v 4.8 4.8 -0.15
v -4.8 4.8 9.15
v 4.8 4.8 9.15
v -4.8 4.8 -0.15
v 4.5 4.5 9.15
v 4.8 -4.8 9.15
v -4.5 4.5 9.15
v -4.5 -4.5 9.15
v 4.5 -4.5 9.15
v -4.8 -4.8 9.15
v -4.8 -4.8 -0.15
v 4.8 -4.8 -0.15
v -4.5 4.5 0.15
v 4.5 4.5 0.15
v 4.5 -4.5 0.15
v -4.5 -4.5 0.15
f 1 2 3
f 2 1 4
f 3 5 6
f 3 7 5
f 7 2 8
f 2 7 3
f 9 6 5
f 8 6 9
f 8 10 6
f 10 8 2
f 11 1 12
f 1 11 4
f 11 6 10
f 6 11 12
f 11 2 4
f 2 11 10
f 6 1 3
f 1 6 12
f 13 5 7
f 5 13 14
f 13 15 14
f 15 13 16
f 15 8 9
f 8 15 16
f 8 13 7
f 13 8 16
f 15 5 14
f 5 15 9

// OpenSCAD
// [FL_INDEX: keywords="openscad, 3d_parametric, World_s_Smallest_3D_printed_Soma_Cube_Puzzle, csg_solid" | COT="Parametric OpenSCAD design from 3DCodeverse"]
// Title: World's Smallest 3D printed Soma Cube Puzzle

// ===== file: SmallSomaCube.scad =====
//Scalable Soma Cube, by Alejandro Erickson
//Derived from: http://www.thingiverse.com/thing:3784 and http://www.thingiverse.com/thing:11644


//Size of Unit Cubes in mm.  Perhaps unit-shaveMM should be a multiple of your z-layer height
unit = 3; 

//Amount to shave off (inset) each piece.  Compensates for small print size.
shaveMM=.1;

part = "all";//[corner,ess,tee,rightsnake,leftsnake,angle,ell,all]


module c()
{
	cube(size=unit, center=true);
}



module bigC()
{
	cube(size=100*unit, center=true);
}

module Shave(){
  for (i = [0 : $children-1])	{
	minkowski(){
	difference(){
		bigC(); 
		minkowski(){
			difference(){ 
				bigC(); 
				child(i);
			} 
			cube(size=2*shaveMM, center=true);
		}
	}
	}	
}
}


module c1()
{
  translate([0,0,0.5*unit]) Shave() rotate(180,[0,0,1])  union()
  {
    c();
    translate([unit,0,0]) c();
    translate([unit,unit,0]) c();
    translate([unit,0,unit]) c();
  }
}



module c2()
{
translate([0,0,1.5*unit])  //angle
Shave() rotate(180,[0,0,1]) rotate(90,[0,1,0]) union()
  {
    c();
    translate([unit,0,0]) c();
    translate([unit,unit,0]) c();
  }
}


module c3()
{
translate([0,0,0.5*unit])  //ess
  Shave() rotate(180,[1,0,0]) rotate(90,[0,0,1])  union()
  {
    c();
    translate([unit,0,0]) c();
    translate([unit,unit,0]) c();
    translate([2*unit,unit,0]) c();
  }
}


module c4()
{translate([0,0,0.5*unit])
  Shave() rotate(90,[1,0,0])  union()
  {
    c();
    translate([unit,0,0]) c();
    translate([unit,unit,0]) c();
    translate([2*unit,0,0]) c();
  }
}


module c5()
{translate([0,0,0.5*unit])
  Shave() rotate(180,[0,0,1]) union()
  {
    c();
    translate([unit,0,0]) c();
    translate([unit,unit,0]) c();
    translate([unit,unit,unit]) c();
  }
}


module c6()
{translate([0,0,0.5*unit])
  Shave() union()
  {
    c();
    translate([unit,0,0]) c();
    translate([unit,unit,0]) c();
    translate([0,0,unit]) c();
  }
}


module c7()
{
translate([0,0,2.5*unit])
  Shave() rotate(90,[0,1,0])  union()
  {
    c();
    translate([unit,0,0]) c();
    translate([2*unit,unit,0]) c();
    translate([2*unit,0,0]) c();
  }
}

translate([0,0,-shaveMM])
scale(1) rotate(90,[0,0,1])
{
if(part == "all"){
translate([-2*unit,5*unit,0])  c1(); //corner
translate([-2*unit,2*unit,0]) c3(); //ess
translate([0*unit,0*unit,0]) c4(); //tee
translate([0*unit,2*unit,0]) c6(); //rightsnake
translate([1*unit,6*unit,0]) c5(); //leftsnake
translate([3*unit,3*unit,0]) c2(); //angle
translate([3*unit,5*unit,0]) c7(); //ell
}
else if(part == "corner") c1();
else if(part == "ess") c2();
else if(part == "tee") c3();
else if(part == "leftsnake") c4();
else if(part == "rightsnake") c5();
else if(part == "angle") c6();
else if(part == "ell") c7();
}

// ===== file: SmallSomaCube_-_box_untested.scad =====
//Scalable Soma Cube, by Alejandro Erickson
//Derived from: http://www.thingiverse.com/thing:3784 and http://www.thingiverse.com/thing:11644


//Size of Unit Cubes in mm.  Perhaps unit-shaveMM should be a multiple of your z-layer height
unit = 3; 

//Amount to shave off (inset) each piece.  Compensates for small print size.
shaveMM=.15;

//Box thickness (for the containing box)
boxThickness = .3;

part = "box";//[corner,ess,tee,rightsnake,leftsnake,angle,ell,all,box,lid]

module somaBox(){
render() 
	translate([0,0,0.5*(3*unit+boxThickness)]) difference(){
  		cube(size=[3*unit+2*boxThickness,3*unit+2*boxThickness, 3*unit+boxThickness],center=true);	
  		translate([0,0,boxThickness*0.5]) cube(size=3*unit, center= true);
	}
}

module somaLid(){
	render() translate([0,0, 1.5*boxThickness]) difference(){
		cube(size=[3*unit+4*boxThickness+shaveMM, 3*unit+4*boxThickness+shaveMM, 3*boxThickness],center=true);
		translate([0,0,0.5*boxThickness]) cube(size=[3*unit+2*boxThickness+shaveMM, 3*unit+2*boxThickness+shaveMM, 2*boxThickness],center=true);

}
}

module c()
{
	cube(size=unit, center=true);
}



module bigC()
{
	cube(size=100*unit, center=true);
}

module Shave(){
  for (i = [0 : $children-1])	{
	minkowski(){
	difference(){
		bigC(); 
		minkowski(){
			difference(){ 
				bigC(); 
				child(i);
			} 
			cube(size=2*shaveMM, center=true);
		}
	}
	}	
}
}


module c1()
{
  translate([0,0,0.5*unit]) Shave() rotate(180,[0,0,1])  union()
  {
    c();
    translate([unit,0,0]) c();
    translate([unit,unit,0]) c();
    translate([unit,0,unit]) c();
  }
}



module c2()
{
translate([0,0,1.5*unit])  //angle
Shave() rotate(180,[0,0,1]) rotate(90,[0,1,0]) union()
  {
    c();
    translate([unit,0,0]) c();
    translate([unit,unit,0]) c();
  }
}


module c3()
{
translate([0,0,0.5*unit])  //ess
  Shave() rotate(180,[1,0,0]) rotate(90,[0,0,1])  union()
  {
    c();
    translate([unit,0,0]) c();
    translate([unit,unit,0]) c();
    translate([2*unit,unit,0]) c();
  }
}


module c4()
{translate([0,0,0.5*unit])
  Shave() rotate(90,[1,0,0])  union()
  {
    c();
    translate([unit,0,0]) c();
    translate([unit,unit,0]) c();
    translate([2*unit,0,0]) c();
  }
}


module c5()
{translate([0,0,0.5*unit])
  Shave() rotate(180,[0,0,1]) union()
  {
    c();
    translate([unit,0,0]) c();
    translate([unit,unit,0]) c();
    translate([unit,unit,unit]) c();
  }
}


module c6()
{translate([0,0,0.5*unit])
  Shave() union()
  {
    c();
    translate([unit,0,0]) c();
    translate([unit,unit,0]) c();
    translate([0,0,unit]) c();
  }
}


module c7()
{
translate([0,0,2.5*unit])
  Shave() rotate(90,[0,1,0])  union()
  {
    c();
    translate([unit,0,0]) c();
    translate([2*unit,unit,0]) c();
    translate([2*unit,0,0]) c();
  }
}

translate([0,0,-shaveMM])
scale(1) rotate(90,[0,0,1])
{
if(part == "all"){
translate([-2*unit,5*unit,0])  c1(); //corner
translate([-2*unit,2*unit,0]) c3(); //ess
translate([0*unit,0*unit,0]) c4(); //tee
translate([0*unit,2*unit,0]) c6(); //rightsnake
translate([1*unit,6*unit,0]) c5(); //leftsnake
translate([3*unit,3*unit,0]) c2(); //angle
translate([3*unit,5*unit,0]) c7(); //ell
}
else if(part == "corner") c1();
else if(part == "ess") c2();
else if(part == "tee") c3();
else if(part == "leftsnake") c4();
else if(part == "rightsnake") c5();
else if(part == "angle") c6();
else if(part == "ell") c7();
else if(part == "box") somaBox();
else if(part == "lid") somaLid();
}
